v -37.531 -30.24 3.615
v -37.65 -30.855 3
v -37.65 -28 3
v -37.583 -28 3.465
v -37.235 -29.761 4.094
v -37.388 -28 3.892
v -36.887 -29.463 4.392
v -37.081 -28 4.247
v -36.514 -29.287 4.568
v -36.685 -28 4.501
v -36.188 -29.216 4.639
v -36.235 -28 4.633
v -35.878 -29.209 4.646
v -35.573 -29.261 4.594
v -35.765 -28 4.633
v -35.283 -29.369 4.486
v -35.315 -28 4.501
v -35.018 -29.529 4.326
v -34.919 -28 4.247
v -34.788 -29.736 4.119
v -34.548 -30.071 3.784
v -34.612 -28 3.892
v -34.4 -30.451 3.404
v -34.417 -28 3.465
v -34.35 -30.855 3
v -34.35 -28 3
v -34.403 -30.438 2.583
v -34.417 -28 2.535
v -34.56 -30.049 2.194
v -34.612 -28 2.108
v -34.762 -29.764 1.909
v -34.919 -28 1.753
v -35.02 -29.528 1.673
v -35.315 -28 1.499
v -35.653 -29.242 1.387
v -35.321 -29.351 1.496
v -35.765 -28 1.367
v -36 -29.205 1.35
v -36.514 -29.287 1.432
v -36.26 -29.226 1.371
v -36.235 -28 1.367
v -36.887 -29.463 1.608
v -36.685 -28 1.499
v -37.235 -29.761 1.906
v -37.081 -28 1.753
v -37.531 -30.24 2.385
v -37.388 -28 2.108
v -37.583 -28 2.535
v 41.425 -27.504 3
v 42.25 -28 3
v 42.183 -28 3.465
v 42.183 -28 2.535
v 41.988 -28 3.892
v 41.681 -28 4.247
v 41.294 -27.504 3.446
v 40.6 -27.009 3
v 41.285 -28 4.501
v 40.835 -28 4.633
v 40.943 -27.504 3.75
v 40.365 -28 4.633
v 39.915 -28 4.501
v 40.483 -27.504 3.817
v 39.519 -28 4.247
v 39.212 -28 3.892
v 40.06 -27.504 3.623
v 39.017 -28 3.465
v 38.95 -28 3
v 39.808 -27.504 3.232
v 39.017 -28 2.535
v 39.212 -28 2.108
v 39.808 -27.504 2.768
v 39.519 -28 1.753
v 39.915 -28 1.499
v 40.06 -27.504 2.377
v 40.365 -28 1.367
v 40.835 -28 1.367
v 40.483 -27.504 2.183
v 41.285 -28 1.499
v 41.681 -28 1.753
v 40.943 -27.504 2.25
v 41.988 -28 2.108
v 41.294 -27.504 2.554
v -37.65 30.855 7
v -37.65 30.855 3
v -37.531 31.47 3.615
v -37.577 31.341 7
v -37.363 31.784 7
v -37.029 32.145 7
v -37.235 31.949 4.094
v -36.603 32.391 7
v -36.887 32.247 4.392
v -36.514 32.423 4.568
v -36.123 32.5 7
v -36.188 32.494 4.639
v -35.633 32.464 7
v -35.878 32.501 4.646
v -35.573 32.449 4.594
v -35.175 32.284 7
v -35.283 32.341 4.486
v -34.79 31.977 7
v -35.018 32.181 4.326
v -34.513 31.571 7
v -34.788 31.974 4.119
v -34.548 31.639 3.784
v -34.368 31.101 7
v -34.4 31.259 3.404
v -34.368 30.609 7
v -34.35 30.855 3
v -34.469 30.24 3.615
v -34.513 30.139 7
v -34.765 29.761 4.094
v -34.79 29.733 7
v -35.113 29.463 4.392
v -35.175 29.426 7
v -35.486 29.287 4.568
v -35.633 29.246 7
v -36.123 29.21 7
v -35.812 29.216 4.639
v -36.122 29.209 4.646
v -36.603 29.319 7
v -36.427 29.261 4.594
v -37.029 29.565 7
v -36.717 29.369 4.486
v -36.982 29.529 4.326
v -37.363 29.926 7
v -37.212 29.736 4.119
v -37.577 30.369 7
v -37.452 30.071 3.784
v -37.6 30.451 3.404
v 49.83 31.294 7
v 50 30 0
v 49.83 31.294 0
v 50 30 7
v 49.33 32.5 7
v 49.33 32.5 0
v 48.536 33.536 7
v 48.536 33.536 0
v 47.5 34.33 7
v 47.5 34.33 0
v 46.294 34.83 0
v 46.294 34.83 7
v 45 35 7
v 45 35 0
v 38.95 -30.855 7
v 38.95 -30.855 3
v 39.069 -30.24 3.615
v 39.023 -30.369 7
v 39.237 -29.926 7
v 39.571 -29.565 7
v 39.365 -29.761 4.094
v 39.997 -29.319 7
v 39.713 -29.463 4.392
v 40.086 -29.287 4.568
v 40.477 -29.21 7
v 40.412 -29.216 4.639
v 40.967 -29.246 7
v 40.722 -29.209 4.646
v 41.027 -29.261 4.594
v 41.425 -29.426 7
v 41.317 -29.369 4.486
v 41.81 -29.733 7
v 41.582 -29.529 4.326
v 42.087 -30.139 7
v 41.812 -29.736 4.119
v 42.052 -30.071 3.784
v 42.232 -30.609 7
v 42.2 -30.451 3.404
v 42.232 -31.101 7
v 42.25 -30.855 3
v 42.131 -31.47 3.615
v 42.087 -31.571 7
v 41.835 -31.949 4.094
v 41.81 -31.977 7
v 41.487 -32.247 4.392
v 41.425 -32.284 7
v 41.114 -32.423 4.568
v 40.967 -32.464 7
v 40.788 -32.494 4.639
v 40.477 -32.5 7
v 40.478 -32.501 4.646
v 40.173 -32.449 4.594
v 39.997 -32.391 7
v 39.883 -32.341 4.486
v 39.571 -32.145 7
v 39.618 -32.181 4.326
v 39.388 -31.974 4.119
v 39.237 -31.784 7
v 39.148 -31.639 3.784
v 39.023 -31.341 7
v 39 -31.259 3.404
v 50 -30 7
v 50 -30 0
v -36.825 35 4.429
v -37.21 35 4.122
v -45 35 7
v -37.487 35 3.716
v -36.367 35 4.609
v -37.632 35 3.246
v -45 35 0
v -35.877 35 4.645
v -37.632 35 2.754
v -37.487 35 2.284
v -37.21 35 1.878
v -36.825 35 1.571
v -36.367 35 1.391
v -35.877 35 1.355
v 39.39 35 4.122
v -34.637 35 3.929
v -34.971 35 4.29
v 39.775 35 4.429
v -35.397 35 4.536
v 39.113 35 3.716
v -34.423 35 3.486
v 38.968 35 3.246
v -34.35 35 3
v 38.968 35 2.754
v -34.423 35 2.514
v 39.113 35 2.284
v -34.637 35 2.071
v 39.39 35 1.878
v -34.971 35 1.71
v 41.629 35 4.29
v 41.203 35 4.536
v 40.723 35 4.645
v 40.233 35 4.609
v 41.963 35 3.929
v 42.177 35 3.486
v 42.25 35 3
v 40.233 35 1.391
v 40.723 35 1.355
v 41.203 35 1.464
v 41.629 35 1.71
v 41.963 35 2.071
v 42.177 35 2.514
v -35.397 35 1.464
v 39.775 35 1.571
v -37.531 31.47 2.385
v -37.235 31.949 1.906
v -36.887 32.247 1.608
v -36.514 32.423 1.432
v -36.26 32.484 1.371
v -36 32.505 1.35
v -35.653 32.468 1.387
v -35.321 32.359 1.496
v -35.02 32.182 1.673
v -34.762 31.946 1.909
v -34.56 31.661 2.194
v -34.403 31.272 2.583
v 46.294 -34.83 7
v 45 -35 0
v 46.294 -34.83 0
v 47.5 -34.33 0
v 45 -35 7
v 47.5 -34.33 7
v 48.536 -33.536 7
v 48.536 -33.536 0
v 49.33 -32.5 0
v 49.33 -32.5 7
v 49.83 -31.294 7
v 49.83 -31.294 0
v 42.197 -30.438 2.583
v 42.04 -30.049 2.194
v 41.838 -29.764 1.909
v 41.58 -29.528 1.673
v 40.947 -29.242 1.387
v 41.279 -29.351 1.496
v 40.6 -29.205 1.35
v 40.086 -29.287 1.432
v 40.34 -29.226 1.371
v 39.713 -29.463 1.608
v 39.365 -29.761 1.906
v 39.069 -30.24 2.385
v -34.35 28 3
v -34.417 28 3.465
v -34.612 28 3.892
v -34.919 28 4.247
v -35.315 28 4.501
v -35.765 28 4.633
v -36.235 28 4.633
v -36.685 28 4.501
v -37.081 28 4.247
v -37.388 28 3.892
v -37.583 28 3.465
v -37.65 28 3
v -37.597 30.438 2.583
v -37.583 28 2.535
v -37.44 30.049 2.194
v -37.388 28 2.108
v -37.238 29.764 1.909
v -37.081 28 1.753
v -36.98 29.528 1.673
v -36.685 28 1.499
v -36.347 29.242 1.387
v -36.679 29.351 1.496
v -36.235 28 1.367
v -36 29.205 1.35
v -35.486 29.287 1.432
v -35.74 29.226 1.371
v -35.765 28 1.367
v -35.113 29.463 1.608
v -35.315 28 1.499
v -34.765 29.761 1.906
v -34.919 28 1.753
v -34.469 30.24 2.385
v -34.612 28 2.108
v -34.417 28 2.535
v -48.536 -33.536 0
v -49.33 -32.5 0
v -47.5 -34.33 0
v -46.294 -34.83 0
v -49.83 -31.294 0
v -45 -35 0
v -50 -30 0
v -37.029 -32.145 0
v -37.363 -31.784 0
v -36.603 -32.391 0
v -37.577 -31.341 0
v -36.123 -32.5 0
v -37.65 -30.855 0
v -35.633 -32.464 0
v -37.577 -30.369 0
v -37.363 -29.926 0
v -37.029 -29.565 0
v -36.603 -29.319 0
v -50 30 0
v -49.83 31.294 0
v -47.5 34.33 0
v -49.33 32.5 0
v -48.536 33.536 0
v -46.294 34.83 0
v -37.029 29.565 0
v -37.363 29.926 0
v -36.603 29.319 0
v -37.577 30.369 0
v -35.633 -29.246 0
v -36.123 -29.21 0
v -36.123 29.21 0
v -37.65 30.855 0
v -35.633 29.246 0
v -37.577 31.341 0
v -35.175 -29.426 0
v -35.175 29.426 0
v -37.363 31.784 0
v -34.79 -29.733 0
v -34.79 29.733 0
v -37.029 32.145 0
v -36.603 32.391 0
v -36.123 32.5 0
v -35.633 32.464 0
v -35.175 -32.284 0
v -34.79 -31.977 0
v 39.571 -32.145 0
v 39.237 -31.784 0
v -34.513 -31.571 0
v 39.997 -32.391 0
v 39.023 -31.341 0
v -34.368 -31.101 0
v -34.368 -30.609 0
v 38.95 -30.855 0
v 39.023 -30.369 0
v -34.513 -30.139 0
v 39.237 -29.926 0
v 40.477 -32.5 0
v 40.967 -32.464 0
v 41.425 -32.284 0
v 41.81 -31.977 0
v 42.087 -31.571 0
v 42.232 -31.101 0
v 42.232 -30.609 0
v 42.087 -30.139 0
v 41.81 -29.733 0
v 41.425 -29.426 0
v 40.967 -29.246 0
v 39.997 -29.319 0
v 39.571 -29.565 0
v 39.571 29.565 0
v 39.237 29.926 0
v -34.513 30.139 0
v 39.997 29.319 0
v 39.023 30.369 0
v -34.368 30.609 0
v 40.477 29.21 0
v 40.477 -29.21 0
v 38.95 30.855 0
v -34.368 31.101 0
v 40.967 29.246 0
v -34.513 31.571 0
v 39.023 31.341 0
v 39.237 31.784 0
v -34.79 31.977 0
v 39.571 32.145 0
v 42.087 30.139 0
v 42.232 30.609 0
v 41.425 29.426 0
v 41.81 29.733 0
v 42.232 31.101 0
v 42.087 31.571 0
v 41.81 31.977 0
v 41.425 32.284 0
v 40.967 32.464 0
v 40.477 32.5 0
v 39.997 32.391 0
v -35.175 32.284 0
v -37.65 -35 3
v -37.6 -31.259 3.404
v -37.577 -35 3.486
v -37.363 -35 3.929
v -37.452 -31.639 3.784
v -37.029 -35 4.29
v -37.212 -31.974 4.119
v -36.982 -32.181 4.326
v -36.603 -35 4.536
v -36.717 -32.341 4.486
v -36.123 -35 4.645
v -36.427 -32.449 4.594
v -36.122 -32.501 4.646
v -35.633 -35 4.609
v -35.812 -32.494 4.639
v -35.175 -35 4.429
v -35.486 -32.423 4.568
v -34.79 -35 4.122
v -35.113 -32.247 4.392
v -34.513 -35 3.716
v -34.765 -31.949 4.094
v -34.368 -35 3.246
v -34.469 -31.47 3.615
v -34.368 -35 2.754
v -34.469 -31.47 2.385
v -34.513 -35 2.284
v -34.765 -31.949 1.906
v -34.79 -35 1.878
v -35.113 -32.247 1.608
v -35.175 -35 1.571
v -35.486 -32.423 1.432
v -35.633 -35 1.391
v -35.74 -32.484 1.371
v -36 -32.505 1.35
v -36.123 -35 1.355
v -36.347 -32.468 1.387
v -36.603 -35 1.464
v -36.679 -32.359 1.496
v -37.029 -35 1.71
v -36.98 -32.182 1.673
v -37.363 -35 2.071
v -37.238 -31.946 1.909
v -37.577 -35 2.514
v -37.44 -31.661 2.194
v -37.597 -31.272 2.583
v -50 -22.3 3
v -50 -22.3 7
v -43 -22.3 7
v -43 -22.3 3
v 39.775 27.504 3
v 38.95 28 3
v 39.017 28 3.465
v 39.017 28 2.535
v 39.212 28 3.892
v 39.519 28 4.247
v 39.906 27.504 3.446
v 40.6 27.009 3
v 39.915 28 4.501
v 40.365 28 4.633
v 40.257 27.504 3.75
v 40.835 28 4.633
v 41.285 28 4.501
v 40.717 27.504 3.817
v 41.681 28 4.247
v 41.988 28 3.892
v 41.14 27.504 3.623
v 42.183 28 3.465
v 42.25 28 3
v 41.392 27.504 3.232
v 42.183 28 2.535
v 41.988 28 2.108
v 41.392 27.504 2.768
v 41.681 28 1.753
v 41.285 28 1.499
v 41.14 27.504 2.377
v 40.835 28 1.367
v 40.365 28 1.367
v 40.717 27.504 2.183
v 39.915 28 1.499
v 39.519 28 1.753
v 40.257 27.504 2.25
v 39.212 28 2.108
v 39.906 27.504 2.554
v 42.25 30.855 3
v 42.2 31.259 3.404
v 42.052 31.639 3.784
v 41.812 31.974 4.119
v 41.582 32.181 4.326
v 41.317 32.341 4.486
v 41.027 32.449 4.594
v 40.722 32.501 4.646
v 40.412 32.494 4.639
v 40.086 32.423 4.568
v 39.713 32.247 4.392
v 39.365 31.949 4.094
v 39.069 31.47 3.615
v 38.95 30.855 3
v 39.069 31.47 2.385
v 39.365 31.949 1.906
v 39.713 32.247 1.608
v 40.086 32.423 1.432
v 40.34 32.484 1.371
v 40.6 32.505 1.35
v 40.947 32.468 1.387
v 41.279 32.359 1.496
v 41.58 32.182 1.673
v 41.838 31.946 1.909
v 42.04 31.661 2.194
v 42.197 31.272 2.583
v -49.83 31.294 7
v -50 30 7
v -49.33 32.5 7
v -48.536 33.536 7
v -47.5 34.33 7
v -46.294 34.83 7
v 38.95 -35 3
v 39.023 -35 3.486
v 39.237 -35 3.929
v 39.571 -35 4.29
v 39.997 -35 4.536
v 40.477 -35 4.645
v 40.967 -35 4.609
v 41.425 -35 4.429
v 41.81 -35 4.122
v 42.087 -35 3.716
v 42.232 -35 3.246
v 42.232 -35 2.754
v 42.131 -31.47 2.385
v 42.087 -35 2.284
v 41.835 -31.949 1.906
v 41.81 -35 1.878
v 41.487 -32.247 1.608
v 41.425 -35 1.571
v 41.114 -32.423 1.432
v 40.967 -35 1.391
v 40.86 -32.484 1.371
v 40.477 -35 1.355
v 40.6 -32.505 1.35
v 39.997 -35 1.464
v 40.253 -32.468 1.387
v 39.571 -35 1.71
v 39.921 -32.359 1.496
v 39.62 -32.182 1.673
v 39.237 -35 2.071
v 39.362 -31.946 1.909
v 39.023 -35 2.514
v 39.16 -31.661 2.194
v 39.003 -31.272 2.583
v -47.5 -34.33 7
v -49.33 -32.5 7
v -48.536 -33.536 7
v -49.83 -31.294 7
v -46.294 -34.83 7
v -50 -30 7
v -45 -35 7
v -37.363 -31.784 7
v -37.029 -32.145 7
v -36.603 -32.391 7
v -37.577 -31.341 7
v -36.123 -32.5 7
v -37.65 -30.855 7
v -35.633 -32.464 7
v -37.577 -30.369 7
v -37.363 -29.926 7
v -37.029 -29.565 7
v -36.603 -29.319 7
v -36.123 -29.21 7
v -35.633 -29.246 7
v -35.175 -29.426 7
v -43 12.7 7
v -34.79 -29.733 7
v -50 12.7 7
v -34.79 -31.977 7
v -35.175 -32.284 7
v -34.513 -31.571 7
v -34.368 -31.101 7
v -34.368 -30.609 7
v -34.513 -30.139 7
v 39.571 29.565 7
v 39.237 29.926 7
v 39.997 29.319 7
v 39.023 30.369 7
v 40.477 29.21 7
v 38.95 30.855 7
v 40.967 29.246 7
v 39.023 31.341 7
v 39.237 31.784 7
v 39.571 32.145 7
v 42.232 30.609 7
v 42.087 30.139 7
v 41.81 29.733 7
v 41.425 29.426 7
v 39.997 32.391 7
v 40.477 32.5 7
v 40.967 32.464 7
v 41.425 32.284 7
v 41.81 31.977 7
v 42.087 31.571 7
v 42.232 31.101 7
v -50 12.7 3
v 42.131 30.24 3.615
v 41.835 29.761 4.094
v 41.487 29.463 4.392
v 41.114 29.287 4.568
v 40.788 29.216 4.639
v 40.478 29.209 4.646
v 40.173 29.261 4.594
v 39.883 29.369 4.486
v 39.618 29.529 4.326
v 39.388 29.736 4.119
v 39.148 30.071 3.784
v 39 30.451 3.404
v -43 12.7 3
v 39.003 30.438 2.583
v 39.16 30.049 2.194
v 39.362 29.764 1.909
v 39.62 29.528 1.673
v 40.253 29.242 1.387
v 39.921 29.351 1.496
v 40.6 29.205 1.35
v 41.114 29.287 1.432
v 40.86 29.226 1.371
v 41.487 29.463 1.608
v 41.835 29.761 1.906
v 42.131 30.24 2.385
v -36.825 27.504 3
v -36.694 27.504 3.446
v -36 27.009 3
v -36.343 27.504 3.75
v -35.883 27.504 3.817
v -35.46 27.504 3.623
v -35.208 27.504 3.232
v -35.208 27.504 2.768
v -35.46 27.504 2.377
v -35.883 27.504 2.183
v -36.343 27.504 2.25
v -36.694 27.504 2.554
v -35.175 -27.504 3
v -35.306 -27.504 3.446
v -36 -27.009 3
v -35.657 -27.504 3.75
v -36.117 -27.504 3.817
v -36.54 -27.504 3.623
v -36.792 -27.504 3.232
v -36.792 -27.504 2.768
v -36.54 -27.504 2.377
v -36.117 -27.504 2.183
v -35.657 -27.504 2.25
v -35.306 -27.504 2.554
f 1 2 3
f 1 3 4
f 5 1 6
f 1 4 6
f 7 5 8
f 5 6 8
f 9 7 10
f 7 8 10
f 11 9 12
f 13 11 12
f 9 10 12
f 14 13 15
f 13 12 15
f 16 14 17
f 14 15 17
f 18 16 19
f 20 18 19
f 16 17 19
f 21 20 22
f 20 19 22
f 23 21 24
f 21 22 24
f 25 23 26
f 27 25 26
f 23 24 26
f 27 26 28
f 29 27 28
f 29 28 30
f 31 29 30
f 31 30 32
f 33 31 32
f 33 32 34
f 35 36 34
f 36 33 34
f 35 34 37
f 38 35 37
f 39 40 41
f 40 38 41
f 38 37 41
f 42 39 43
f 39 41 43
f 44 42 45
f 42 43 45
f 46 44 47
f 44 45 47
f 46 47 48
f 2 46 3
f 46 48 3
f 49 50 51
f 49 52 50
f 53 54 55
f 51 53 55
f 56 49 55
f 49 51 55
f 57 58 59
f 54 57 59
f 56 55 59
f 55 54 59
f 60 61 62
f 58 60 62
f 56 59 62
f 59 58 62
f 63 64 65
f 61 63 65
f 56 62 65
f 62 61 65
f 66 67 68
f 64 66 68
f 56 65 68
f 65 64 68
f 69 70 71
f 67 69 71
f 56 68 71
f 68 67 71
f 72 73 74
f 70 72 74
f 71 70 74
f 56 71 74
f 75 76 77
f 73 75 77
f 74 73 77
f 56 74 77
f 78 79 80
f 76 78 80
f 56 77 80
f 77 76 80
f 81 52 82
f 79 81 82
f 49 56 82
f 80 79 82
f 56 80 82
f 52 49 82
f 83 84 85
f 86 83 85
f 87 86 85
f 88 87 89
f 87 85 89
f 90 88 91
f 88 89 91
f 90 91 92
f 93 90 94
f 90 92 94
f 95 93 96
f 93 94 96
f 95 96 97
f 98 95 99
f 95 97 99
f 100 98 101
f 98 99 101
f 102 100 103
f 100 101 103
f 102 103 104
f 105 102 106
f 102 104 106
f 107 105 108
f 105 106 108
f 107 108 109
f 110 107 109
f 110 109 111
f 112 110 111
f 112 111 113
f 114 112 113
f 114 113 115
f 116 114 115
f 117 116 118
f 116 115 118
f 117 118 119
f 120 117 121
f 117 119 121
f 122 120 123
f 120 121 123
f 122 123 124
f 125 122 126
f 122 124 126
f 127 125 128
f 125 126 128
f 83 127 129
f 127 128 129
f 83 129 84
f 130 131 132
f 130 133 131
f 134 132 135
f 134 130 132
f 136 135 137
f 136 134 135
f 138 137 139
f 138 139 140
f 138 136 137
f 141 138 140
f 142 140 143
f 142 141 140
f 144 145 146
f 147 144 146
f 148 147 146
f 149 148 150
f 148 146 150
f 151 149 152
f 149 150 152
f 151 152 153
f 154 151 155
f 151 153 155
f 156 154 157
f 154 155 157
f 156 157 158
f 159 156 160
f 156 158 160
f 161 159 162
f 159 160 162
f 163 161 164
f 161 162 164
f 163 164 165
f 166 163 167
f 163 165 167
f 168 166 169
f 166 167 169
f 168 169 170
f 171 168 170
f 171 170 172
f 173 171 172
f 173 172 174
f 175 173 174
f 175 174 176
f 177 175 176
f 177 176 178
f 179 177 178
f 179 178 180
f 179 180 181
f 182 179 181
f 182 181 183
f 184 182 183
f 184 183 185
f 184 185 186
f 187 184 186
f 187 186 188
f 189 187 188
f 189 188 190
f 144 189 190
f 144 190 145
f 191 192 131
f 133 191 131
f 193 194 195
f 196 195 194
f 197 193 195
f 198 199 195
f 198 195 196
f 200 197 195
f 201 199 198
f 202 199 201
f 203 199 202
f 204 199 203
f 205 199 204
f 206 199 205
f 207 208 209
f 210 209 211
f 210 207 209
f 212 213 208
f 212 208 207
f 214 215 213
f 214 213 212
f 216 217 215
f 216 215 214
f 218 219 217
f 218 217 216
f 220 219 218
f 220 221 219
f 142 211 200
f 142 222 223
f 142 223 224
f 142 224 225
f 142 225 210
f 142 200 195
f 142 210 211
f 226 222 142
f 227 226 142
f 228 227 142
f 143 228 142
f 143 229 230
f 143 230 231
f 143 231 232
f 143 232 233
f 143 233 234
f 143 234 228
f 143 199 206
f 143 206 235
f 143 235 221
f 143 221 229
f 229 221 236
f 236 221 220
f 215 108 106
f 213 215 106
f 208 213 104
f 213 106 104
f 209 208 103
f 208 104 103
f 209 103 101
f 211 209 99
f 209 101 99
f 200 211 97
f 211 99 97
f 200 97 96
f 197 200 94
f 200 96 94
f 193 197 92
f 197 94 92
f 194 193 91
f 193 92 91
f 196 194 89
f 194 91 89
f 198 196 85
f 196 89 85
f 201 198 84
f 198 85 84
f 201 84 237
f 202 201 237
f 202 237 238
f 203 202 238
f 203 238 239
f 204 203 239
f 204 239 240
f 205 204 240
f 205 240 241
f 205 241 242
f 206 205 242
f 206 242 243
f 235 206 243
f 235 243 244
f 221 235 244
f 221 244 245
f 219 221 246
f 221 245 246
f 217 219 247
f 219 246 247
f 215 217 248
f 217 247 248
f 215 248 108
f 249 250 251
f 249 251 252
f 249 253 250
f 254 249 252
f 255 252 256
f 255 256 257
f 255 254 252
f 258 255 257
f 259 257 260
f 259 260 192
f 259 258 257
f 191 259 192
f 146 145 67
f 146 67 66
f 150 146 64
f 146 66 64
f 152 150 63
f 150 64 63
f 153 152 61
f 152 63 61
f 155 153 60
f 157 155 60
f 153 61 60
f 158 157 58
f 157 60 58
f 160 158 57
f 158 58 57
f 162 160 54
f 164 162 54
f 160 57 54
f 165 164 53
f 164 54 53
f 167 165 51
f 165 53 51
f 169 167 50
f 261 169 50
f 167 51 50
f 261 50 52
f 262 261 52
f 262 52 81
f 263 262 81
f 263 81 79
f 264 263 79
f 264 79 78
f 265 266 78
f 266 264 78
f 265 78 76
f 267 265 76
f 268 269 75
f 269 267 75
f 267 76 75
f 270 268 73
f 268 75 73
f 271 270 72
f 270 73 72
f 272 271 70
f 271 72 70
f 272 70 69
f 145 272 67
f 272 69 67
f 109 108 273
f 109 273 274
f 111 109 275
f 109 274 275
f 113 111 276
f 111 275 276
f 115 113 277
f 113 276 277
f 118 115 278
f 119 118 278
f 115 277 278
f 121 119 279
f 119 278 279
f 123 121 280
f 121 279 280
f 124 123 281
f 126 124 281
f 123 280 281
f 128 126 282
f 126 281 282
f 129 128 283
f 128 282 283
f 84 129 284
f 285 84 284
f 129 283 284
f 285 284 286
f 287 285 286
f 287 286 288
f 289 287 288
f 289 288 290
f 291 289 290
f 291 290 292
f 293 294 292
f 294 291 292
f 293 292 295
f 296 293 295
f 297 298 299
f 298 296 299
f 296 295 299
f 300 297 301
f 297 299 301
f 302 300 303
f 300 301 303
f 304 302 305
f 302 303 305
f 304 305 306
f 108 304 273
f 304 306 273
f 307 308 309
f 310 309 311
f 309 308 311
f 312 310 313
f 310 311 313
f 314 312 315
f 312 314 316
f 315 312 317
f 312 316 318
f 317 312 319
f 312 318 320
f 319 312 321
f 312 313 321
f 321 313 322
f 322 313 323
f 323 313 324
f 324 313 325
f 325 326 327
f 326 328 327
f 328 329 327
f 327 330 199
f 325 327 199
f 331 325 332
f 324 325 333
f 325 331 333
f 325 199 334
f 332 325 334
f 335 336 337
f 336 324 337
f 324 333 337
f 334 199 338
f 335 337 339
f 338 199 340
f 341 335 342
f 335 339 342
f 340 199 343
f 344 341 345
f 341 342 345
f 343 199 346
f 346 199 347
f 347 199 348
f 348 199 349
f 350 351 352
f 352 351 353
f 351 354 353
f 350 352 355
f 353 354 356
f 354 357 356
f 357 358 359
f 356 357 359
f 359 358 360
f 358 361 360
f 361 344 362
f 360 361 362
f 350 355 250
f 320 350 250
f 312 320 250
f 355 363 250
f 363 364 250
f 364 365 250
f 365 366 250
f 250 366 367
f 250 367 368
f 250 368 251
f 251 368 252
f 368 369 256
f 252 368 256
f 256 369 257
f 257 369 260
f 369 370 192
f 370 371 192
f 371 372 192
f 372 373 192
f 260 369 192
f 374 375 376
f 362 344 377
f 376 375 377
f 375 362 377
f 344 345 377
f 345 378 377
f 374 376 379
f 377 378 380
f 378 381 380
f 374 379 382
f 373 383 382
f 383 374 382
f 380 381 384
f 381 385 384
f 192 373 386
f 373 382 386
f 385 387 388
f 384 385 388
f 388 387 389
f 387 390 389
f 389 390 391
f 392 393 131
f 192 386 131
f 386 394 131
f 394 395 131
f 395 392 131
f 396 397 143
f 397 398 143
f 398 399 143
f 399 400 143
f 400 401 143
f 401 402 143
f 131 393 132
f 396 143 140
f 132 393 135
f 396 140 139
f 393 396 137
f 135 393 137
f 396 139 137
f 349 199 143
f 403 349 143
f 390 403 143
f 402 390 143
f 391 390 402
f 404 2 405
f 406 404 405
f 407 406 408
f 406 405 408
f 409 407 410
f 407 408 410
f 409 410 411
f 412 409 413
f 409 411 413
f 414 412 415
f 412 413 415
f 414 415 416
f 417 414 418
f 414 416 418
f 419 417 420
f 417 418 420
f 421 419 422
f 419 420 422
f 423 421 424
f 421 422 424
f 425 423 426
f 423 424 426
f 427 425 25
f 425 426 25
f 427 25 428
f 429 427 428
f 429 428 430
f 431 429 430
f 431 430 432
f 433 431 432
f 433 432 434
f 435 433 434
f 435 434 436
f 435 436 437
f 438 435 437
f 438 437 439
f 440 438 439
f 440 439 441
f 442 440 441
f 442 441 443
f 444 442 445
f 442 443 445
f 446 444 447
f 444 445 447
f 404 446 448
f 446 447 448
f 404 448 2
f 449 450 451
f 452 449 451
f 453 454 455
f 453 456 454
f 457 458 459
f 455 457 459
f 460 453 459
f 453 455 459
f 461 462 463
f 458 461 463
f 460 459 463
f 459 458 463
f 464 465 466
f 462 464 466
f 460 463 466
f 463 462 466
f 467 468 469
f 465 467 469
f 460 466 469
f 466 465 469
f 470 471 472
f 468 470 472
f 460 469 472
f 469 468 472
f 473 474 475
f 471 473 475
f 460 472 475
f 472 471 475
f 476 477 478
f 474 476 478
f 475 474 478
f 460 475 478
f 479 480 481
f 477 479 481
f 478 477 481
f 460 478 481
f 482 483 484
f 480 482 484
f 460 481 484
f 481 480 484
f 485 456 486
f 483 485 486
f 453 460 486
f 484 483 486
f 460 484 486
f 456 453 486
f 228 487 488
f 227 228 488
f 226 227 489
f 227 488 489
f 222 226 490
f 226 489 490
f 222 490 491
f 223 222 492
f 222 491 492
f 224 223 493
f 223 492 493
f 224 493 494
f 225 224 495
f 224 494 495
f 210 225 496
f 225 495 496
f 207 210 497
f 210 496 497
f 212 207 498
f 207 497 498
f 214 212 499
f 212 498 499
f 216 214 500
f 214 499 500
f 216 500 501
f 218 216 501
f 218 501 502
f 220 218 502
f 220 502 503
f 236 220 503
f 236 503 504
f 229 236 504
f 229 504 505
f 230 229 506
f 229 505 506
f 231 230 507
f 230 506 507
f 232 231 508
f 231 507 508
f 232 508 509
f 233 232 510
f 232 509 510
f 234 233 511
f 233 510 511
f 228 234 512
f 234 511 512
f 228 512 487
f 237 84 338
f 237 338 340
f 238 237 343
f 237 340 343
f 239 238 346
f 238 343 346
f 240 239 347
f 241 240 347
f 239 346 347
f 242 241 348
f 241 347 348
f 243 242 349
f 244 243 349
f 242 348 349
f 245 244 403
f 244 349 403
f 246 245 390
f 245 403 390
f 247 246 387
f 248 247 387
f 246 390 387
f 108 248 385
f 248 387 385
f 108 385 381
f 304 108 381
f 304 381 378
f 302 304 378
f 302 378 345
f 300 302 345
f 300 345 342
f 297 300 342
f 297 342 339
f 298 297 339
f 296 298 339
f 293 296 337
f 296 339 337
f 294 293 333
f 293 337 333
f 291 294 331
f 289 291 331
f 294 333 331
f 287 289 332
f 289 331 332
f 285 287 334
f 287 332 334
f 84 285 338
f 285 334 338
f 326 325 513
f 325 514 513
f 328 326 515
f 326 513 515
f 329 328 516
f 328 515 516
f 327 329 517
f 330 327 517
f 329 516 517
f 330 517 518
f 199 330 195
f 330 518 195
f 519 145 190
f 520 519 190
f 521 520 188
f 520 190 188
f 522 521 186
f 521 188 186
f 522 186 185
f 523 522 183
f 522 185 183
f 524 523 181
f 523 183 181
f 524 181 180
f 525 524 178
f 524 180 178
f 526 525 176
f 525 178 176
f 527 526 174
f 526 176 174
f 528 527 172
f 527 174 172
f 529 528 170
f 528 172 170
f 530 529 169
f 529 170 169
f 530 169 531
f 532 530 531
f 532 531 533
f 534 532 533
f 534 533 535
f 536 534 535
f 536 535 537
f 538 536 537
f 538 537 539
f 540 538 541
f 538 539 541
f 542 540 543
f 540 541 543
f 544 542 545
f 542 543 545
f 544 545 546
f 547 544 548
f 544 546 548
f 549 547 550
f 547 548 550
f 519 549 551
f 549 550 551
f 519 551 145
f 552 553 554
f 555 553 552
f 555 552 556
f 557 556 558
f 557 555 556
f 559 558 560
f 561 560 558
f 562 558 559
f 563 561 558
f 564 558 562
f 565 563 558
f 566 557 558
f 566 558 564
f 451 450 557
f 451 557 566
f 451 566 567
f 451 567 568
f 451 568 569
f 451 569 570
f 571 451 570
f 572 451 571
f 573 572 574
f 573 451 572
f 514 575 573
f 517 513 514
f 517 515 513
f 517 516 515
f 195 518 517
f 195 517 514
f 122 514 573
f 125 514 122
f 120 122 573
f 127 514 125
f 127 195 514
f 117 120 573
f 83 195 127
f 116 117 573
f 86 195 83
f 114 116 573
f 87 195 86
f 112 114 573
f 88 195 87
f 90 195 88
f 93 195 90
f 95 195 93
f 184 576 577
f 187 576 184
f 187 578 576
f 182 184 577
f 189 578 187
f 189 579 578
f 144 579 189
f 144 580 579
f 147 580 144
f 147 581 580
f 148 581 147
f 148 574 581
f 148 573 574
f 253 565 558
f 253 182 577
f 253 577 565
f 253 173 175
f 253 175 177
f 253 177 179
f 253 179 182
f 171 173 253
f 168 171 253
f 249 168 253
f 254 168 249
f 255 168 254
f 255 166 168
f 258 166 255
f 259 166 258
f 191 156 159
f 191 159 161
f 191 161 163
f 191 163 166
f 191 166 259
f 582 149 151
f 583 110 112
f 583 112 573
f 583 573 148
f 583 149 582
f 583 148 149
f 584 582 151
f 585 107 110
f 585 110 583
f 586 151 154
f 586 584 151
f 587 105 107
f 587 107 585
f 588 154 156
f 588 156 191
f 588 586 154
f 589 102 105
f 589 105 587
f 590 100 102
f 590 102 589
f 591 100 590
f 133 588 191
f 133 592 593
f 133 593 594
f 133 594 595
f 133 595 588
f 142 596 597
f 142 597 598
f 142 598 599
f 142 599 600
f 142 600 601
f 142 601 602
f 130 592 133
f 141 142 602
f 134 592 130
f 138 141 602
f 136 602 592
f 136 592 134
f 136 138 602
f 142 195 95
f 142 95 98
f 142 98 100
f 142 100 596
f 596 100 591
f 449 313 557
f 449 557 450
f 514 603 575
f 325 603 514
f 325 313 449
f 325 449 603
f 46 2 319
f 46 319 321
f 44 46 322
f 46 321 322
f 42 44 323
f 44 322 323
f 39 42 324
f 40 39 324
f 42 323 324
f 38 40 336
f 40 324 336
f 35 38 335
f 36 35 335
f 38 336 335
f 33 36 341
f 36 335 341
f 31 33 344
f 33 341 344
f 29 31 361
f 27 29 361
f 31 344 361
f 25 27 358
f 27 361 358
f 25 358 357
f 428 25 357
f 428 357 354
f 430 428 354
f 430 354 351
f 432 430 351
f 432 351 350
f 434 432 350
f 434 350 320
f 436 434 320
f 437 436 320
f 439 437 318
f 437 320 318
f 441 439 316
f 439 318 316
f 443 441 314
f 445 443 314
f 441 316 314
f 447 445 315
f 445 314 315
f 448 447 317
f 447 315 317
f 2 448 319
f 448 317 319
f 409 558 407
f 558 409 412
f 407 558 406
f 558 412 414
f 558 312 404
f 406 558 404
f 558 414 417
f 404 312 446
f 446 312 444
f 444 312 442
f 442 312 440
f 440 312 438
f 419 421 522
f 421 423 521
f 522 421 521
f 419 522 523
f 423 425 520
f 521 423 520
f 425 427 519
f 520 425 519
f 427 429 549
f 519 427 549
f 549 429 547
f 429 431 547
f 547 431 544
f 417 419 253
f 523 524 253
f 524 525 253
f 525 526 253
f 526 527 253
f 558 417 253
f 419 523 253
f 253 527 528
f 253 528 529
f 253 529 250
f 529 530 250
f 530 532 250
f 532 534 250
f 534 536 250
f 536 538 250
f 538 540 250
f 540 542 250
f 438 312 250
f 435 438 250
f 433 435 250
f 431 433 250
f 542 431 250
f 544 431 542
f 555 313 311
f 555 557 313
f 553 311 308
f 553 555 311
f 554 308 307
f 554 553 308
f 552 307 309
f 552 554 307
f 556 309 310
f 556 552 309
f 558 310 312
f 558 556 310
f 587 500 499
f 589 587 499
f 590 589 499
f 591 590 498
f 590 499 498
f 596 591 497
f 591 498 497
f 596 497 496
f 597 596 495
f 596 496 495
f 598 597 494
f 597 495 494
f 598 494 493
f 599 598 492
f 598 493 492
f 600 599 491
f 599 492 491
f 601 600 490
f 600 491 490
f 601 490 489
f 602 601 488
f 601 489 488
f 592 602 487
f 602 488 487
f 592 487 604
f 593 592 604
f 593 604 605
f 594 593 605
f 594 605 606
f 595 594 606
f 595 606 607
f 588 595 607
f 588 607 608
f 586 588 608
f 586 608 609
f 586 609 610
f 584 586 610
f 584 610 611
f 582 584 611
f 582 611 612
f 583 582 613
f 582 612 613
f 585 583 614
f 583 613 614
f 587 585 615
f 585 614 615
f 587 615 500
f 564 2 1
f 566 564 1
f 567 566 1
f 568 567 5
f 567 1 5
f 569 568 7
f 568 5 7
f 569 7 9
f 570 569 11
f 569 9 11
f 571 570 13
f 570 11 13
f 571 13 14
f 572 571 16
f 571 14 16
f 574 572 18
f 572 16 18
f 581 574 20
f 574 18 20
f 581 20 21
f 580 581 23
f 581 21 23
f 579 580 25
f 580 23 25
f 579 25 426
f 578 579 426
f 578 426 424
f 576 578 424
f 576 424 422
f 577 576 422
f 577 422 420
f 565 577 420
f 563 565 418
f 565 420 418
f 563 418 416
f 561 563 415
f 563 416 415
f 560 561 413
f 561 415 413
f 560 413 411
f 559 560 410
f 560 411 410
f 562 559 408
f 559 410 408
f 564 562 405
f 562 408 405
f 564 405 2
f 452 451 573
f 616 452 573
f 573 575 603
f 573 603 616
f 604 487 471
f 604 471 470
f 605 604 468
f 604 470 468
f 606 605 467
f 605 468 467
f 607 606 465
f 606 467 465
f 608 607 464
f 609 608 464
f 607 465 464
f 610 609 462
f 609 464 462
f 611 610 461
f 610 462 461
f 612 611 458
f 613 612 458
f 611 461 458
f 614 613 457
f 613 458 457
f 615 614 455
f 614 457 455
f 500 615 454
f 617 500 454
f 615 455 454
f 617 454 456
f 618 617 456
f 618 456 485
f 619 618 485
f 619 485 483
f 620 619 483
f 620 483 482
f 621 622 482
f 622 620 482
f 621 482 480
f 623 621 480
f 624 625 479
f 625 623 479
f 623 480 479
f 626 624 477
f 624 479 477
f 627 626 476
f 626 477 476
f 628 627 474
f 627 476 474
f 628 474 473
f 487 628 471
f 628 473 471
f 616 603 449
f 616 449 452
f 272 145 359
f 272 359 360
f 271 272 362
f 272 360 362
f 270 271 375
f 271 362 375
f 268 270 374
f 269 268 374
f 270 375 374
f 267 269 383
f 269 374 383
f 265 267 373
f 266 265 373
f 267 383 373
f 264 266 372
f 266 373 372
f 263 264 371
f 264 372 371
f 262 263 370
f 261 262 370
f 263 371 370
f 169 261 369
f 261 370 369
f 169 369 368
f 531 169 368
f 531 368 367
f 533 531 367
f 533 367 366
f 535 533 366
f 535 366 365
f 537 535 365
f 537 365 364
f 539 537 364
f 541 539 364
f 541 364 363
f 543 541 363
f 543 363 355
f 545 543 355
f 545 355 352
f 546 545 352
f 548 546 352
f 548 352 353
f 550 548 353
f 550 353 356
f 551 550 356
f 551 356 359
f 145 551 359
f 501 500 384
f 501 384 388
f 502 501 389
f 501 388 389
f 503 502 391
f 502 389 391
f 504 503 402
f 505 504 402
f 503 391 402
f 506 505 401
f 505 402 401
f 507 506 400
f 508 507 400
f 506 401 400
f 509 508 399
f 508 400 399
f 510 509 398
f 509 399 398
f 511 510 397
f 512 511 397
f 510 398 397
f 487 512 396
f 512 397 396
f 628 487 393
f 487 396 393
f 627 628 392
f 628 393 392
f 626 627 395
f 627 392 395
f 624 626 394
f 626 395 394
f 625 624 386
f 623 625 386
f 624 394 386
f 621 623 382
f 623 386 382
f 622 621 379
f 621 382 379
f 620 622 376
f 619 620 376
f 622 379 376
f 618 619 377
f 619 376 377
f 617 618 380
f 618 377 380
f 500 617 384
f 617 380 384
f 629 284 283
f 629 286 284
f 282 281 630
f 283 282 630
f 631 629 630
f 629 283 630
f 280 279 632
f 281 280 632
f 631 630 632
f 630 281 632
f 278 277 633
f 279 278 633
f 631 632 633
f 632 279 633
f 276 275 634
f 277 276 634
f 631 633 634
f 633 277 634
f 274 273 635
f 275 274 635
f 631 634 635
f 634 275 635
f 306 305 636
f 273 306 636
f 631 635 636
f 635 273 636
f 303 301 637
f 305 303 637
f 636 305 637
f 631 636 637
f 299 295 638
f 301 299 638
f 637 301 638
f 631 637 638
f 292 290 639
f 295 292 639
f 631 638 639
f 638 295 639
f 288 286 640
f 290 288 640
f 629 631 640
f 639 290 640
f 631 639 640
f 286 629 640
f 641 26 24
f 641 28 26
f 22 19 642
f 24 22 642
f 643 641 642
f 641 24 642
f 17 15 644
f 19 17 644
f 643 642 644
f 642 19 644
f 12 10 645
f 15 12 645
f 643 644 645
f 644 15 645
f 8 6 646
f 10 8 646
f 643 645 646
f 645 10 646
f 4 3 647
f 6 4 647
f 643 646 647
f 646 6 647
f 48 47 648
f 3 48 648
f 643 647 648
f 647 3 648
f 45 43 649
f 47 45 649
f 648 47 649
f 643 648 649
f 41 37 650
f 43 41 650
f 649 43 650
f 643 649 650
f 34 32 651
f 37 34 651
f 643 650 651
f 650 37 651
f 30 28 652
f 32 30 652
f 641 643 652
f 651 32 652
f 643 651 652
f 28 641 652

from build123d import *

# Parameters (mm, degrees)
F0_W           = 100
F0_H           = 70
F1_DEPTH       = 7
F2_R           = 5
F6_D           = 3.3
F6_DEPTH       = 7
F6_TIP         = 0.9914200214
F6_ON_F5_D     = 3.3
F6_ON_F5_DEPTH = 7
F6_ON_F5_TIP   = 0.9914200214
F6_ON_F4_D     = 3.3
F6_ON_F4_DEPTH = 7
F6_ON_F4_TIP   = 0.9914200214
F7_W           = 7
F7_H           = 35
F8_DEPTH       = 4


with BuildPart() as f1:
    # F0 (on Top) → F1 (new body)
    with BuildSketch(Plane.XY):
        Rectangle(F0_W, F0_H)
    extrude(amount=F1_DEPTH)

    # F2
    f2_edges = [f1.edges().sort_by_distance(p)[0] for p in [
        (-50, -35, 3.5),
        (50, -35, 3.5),
        (-50, 35, 3.5),
        (50, 35, 3.5),
    ]]
    fillet(f2_edges, radius=F2_R)

    # F6
    with Locations(Plane.XY.offset(7)):
        with Locations((-36, 30.855), (-36, -30.855), (40.6, -30.855), (40.6, 30.855)):
            Hole(F6_D / 2, depth=F6_DEPTH)
            with Locations((0, 0, -(F6_DEPTH + F6_TIP / 2))):  # 118° drill point
                Cone(0, F6_D / 2, F6_TIP, mode=Mode.SUBTRACT)

    # F6 on F5
    with Locations(Plane(origin=(0, 35, 0), x_dir=(-1, 0, 0), z_dir=(0, 1, 0))):
        with Locations((-40.6, 3), (36, 3)):
            Hole(F6_ON_F5_D / 2, depth=F6_ON_F5_DEPTH)
            with Locations((0, 0, -(F6_ON_F5_DEPTH + F6_ON_F5_TIP / 2))):  # 118° drill point
                Cone(0, F6_ON_F5_D / 2, F6_ON_F5_TIP, mode=Mode.SUBTRACT)

    # F6 on F4
    with Locations(Plane.XZ.offset(35)):
        with Locations((-36, 3), (40.6, 3)):
            Hole(F6_ON_F4_D / 2, depth=F6_ON_F4_DEPTH)
            with Locations((0, 0, -(F6_ON_F4_DEPTH + F6_ON_F4_TIP / 2))):  # 118° drill point
                Cone(0, F6_ON_F4_D / 2, F6_ON_F4_TIP, mode=Mode.SUBTRACT)

    # F7 (on face) → F8 (cut)
    with BuildSketch(Plane.XY.offset(7)):
        with Locations((-46.5, -4.8)):
            Rectangle(F7_W, F7_H)
    extrude(amount=-F8_DEPTH, mode=Mode.SUBTRACT)


solid = f1.part
